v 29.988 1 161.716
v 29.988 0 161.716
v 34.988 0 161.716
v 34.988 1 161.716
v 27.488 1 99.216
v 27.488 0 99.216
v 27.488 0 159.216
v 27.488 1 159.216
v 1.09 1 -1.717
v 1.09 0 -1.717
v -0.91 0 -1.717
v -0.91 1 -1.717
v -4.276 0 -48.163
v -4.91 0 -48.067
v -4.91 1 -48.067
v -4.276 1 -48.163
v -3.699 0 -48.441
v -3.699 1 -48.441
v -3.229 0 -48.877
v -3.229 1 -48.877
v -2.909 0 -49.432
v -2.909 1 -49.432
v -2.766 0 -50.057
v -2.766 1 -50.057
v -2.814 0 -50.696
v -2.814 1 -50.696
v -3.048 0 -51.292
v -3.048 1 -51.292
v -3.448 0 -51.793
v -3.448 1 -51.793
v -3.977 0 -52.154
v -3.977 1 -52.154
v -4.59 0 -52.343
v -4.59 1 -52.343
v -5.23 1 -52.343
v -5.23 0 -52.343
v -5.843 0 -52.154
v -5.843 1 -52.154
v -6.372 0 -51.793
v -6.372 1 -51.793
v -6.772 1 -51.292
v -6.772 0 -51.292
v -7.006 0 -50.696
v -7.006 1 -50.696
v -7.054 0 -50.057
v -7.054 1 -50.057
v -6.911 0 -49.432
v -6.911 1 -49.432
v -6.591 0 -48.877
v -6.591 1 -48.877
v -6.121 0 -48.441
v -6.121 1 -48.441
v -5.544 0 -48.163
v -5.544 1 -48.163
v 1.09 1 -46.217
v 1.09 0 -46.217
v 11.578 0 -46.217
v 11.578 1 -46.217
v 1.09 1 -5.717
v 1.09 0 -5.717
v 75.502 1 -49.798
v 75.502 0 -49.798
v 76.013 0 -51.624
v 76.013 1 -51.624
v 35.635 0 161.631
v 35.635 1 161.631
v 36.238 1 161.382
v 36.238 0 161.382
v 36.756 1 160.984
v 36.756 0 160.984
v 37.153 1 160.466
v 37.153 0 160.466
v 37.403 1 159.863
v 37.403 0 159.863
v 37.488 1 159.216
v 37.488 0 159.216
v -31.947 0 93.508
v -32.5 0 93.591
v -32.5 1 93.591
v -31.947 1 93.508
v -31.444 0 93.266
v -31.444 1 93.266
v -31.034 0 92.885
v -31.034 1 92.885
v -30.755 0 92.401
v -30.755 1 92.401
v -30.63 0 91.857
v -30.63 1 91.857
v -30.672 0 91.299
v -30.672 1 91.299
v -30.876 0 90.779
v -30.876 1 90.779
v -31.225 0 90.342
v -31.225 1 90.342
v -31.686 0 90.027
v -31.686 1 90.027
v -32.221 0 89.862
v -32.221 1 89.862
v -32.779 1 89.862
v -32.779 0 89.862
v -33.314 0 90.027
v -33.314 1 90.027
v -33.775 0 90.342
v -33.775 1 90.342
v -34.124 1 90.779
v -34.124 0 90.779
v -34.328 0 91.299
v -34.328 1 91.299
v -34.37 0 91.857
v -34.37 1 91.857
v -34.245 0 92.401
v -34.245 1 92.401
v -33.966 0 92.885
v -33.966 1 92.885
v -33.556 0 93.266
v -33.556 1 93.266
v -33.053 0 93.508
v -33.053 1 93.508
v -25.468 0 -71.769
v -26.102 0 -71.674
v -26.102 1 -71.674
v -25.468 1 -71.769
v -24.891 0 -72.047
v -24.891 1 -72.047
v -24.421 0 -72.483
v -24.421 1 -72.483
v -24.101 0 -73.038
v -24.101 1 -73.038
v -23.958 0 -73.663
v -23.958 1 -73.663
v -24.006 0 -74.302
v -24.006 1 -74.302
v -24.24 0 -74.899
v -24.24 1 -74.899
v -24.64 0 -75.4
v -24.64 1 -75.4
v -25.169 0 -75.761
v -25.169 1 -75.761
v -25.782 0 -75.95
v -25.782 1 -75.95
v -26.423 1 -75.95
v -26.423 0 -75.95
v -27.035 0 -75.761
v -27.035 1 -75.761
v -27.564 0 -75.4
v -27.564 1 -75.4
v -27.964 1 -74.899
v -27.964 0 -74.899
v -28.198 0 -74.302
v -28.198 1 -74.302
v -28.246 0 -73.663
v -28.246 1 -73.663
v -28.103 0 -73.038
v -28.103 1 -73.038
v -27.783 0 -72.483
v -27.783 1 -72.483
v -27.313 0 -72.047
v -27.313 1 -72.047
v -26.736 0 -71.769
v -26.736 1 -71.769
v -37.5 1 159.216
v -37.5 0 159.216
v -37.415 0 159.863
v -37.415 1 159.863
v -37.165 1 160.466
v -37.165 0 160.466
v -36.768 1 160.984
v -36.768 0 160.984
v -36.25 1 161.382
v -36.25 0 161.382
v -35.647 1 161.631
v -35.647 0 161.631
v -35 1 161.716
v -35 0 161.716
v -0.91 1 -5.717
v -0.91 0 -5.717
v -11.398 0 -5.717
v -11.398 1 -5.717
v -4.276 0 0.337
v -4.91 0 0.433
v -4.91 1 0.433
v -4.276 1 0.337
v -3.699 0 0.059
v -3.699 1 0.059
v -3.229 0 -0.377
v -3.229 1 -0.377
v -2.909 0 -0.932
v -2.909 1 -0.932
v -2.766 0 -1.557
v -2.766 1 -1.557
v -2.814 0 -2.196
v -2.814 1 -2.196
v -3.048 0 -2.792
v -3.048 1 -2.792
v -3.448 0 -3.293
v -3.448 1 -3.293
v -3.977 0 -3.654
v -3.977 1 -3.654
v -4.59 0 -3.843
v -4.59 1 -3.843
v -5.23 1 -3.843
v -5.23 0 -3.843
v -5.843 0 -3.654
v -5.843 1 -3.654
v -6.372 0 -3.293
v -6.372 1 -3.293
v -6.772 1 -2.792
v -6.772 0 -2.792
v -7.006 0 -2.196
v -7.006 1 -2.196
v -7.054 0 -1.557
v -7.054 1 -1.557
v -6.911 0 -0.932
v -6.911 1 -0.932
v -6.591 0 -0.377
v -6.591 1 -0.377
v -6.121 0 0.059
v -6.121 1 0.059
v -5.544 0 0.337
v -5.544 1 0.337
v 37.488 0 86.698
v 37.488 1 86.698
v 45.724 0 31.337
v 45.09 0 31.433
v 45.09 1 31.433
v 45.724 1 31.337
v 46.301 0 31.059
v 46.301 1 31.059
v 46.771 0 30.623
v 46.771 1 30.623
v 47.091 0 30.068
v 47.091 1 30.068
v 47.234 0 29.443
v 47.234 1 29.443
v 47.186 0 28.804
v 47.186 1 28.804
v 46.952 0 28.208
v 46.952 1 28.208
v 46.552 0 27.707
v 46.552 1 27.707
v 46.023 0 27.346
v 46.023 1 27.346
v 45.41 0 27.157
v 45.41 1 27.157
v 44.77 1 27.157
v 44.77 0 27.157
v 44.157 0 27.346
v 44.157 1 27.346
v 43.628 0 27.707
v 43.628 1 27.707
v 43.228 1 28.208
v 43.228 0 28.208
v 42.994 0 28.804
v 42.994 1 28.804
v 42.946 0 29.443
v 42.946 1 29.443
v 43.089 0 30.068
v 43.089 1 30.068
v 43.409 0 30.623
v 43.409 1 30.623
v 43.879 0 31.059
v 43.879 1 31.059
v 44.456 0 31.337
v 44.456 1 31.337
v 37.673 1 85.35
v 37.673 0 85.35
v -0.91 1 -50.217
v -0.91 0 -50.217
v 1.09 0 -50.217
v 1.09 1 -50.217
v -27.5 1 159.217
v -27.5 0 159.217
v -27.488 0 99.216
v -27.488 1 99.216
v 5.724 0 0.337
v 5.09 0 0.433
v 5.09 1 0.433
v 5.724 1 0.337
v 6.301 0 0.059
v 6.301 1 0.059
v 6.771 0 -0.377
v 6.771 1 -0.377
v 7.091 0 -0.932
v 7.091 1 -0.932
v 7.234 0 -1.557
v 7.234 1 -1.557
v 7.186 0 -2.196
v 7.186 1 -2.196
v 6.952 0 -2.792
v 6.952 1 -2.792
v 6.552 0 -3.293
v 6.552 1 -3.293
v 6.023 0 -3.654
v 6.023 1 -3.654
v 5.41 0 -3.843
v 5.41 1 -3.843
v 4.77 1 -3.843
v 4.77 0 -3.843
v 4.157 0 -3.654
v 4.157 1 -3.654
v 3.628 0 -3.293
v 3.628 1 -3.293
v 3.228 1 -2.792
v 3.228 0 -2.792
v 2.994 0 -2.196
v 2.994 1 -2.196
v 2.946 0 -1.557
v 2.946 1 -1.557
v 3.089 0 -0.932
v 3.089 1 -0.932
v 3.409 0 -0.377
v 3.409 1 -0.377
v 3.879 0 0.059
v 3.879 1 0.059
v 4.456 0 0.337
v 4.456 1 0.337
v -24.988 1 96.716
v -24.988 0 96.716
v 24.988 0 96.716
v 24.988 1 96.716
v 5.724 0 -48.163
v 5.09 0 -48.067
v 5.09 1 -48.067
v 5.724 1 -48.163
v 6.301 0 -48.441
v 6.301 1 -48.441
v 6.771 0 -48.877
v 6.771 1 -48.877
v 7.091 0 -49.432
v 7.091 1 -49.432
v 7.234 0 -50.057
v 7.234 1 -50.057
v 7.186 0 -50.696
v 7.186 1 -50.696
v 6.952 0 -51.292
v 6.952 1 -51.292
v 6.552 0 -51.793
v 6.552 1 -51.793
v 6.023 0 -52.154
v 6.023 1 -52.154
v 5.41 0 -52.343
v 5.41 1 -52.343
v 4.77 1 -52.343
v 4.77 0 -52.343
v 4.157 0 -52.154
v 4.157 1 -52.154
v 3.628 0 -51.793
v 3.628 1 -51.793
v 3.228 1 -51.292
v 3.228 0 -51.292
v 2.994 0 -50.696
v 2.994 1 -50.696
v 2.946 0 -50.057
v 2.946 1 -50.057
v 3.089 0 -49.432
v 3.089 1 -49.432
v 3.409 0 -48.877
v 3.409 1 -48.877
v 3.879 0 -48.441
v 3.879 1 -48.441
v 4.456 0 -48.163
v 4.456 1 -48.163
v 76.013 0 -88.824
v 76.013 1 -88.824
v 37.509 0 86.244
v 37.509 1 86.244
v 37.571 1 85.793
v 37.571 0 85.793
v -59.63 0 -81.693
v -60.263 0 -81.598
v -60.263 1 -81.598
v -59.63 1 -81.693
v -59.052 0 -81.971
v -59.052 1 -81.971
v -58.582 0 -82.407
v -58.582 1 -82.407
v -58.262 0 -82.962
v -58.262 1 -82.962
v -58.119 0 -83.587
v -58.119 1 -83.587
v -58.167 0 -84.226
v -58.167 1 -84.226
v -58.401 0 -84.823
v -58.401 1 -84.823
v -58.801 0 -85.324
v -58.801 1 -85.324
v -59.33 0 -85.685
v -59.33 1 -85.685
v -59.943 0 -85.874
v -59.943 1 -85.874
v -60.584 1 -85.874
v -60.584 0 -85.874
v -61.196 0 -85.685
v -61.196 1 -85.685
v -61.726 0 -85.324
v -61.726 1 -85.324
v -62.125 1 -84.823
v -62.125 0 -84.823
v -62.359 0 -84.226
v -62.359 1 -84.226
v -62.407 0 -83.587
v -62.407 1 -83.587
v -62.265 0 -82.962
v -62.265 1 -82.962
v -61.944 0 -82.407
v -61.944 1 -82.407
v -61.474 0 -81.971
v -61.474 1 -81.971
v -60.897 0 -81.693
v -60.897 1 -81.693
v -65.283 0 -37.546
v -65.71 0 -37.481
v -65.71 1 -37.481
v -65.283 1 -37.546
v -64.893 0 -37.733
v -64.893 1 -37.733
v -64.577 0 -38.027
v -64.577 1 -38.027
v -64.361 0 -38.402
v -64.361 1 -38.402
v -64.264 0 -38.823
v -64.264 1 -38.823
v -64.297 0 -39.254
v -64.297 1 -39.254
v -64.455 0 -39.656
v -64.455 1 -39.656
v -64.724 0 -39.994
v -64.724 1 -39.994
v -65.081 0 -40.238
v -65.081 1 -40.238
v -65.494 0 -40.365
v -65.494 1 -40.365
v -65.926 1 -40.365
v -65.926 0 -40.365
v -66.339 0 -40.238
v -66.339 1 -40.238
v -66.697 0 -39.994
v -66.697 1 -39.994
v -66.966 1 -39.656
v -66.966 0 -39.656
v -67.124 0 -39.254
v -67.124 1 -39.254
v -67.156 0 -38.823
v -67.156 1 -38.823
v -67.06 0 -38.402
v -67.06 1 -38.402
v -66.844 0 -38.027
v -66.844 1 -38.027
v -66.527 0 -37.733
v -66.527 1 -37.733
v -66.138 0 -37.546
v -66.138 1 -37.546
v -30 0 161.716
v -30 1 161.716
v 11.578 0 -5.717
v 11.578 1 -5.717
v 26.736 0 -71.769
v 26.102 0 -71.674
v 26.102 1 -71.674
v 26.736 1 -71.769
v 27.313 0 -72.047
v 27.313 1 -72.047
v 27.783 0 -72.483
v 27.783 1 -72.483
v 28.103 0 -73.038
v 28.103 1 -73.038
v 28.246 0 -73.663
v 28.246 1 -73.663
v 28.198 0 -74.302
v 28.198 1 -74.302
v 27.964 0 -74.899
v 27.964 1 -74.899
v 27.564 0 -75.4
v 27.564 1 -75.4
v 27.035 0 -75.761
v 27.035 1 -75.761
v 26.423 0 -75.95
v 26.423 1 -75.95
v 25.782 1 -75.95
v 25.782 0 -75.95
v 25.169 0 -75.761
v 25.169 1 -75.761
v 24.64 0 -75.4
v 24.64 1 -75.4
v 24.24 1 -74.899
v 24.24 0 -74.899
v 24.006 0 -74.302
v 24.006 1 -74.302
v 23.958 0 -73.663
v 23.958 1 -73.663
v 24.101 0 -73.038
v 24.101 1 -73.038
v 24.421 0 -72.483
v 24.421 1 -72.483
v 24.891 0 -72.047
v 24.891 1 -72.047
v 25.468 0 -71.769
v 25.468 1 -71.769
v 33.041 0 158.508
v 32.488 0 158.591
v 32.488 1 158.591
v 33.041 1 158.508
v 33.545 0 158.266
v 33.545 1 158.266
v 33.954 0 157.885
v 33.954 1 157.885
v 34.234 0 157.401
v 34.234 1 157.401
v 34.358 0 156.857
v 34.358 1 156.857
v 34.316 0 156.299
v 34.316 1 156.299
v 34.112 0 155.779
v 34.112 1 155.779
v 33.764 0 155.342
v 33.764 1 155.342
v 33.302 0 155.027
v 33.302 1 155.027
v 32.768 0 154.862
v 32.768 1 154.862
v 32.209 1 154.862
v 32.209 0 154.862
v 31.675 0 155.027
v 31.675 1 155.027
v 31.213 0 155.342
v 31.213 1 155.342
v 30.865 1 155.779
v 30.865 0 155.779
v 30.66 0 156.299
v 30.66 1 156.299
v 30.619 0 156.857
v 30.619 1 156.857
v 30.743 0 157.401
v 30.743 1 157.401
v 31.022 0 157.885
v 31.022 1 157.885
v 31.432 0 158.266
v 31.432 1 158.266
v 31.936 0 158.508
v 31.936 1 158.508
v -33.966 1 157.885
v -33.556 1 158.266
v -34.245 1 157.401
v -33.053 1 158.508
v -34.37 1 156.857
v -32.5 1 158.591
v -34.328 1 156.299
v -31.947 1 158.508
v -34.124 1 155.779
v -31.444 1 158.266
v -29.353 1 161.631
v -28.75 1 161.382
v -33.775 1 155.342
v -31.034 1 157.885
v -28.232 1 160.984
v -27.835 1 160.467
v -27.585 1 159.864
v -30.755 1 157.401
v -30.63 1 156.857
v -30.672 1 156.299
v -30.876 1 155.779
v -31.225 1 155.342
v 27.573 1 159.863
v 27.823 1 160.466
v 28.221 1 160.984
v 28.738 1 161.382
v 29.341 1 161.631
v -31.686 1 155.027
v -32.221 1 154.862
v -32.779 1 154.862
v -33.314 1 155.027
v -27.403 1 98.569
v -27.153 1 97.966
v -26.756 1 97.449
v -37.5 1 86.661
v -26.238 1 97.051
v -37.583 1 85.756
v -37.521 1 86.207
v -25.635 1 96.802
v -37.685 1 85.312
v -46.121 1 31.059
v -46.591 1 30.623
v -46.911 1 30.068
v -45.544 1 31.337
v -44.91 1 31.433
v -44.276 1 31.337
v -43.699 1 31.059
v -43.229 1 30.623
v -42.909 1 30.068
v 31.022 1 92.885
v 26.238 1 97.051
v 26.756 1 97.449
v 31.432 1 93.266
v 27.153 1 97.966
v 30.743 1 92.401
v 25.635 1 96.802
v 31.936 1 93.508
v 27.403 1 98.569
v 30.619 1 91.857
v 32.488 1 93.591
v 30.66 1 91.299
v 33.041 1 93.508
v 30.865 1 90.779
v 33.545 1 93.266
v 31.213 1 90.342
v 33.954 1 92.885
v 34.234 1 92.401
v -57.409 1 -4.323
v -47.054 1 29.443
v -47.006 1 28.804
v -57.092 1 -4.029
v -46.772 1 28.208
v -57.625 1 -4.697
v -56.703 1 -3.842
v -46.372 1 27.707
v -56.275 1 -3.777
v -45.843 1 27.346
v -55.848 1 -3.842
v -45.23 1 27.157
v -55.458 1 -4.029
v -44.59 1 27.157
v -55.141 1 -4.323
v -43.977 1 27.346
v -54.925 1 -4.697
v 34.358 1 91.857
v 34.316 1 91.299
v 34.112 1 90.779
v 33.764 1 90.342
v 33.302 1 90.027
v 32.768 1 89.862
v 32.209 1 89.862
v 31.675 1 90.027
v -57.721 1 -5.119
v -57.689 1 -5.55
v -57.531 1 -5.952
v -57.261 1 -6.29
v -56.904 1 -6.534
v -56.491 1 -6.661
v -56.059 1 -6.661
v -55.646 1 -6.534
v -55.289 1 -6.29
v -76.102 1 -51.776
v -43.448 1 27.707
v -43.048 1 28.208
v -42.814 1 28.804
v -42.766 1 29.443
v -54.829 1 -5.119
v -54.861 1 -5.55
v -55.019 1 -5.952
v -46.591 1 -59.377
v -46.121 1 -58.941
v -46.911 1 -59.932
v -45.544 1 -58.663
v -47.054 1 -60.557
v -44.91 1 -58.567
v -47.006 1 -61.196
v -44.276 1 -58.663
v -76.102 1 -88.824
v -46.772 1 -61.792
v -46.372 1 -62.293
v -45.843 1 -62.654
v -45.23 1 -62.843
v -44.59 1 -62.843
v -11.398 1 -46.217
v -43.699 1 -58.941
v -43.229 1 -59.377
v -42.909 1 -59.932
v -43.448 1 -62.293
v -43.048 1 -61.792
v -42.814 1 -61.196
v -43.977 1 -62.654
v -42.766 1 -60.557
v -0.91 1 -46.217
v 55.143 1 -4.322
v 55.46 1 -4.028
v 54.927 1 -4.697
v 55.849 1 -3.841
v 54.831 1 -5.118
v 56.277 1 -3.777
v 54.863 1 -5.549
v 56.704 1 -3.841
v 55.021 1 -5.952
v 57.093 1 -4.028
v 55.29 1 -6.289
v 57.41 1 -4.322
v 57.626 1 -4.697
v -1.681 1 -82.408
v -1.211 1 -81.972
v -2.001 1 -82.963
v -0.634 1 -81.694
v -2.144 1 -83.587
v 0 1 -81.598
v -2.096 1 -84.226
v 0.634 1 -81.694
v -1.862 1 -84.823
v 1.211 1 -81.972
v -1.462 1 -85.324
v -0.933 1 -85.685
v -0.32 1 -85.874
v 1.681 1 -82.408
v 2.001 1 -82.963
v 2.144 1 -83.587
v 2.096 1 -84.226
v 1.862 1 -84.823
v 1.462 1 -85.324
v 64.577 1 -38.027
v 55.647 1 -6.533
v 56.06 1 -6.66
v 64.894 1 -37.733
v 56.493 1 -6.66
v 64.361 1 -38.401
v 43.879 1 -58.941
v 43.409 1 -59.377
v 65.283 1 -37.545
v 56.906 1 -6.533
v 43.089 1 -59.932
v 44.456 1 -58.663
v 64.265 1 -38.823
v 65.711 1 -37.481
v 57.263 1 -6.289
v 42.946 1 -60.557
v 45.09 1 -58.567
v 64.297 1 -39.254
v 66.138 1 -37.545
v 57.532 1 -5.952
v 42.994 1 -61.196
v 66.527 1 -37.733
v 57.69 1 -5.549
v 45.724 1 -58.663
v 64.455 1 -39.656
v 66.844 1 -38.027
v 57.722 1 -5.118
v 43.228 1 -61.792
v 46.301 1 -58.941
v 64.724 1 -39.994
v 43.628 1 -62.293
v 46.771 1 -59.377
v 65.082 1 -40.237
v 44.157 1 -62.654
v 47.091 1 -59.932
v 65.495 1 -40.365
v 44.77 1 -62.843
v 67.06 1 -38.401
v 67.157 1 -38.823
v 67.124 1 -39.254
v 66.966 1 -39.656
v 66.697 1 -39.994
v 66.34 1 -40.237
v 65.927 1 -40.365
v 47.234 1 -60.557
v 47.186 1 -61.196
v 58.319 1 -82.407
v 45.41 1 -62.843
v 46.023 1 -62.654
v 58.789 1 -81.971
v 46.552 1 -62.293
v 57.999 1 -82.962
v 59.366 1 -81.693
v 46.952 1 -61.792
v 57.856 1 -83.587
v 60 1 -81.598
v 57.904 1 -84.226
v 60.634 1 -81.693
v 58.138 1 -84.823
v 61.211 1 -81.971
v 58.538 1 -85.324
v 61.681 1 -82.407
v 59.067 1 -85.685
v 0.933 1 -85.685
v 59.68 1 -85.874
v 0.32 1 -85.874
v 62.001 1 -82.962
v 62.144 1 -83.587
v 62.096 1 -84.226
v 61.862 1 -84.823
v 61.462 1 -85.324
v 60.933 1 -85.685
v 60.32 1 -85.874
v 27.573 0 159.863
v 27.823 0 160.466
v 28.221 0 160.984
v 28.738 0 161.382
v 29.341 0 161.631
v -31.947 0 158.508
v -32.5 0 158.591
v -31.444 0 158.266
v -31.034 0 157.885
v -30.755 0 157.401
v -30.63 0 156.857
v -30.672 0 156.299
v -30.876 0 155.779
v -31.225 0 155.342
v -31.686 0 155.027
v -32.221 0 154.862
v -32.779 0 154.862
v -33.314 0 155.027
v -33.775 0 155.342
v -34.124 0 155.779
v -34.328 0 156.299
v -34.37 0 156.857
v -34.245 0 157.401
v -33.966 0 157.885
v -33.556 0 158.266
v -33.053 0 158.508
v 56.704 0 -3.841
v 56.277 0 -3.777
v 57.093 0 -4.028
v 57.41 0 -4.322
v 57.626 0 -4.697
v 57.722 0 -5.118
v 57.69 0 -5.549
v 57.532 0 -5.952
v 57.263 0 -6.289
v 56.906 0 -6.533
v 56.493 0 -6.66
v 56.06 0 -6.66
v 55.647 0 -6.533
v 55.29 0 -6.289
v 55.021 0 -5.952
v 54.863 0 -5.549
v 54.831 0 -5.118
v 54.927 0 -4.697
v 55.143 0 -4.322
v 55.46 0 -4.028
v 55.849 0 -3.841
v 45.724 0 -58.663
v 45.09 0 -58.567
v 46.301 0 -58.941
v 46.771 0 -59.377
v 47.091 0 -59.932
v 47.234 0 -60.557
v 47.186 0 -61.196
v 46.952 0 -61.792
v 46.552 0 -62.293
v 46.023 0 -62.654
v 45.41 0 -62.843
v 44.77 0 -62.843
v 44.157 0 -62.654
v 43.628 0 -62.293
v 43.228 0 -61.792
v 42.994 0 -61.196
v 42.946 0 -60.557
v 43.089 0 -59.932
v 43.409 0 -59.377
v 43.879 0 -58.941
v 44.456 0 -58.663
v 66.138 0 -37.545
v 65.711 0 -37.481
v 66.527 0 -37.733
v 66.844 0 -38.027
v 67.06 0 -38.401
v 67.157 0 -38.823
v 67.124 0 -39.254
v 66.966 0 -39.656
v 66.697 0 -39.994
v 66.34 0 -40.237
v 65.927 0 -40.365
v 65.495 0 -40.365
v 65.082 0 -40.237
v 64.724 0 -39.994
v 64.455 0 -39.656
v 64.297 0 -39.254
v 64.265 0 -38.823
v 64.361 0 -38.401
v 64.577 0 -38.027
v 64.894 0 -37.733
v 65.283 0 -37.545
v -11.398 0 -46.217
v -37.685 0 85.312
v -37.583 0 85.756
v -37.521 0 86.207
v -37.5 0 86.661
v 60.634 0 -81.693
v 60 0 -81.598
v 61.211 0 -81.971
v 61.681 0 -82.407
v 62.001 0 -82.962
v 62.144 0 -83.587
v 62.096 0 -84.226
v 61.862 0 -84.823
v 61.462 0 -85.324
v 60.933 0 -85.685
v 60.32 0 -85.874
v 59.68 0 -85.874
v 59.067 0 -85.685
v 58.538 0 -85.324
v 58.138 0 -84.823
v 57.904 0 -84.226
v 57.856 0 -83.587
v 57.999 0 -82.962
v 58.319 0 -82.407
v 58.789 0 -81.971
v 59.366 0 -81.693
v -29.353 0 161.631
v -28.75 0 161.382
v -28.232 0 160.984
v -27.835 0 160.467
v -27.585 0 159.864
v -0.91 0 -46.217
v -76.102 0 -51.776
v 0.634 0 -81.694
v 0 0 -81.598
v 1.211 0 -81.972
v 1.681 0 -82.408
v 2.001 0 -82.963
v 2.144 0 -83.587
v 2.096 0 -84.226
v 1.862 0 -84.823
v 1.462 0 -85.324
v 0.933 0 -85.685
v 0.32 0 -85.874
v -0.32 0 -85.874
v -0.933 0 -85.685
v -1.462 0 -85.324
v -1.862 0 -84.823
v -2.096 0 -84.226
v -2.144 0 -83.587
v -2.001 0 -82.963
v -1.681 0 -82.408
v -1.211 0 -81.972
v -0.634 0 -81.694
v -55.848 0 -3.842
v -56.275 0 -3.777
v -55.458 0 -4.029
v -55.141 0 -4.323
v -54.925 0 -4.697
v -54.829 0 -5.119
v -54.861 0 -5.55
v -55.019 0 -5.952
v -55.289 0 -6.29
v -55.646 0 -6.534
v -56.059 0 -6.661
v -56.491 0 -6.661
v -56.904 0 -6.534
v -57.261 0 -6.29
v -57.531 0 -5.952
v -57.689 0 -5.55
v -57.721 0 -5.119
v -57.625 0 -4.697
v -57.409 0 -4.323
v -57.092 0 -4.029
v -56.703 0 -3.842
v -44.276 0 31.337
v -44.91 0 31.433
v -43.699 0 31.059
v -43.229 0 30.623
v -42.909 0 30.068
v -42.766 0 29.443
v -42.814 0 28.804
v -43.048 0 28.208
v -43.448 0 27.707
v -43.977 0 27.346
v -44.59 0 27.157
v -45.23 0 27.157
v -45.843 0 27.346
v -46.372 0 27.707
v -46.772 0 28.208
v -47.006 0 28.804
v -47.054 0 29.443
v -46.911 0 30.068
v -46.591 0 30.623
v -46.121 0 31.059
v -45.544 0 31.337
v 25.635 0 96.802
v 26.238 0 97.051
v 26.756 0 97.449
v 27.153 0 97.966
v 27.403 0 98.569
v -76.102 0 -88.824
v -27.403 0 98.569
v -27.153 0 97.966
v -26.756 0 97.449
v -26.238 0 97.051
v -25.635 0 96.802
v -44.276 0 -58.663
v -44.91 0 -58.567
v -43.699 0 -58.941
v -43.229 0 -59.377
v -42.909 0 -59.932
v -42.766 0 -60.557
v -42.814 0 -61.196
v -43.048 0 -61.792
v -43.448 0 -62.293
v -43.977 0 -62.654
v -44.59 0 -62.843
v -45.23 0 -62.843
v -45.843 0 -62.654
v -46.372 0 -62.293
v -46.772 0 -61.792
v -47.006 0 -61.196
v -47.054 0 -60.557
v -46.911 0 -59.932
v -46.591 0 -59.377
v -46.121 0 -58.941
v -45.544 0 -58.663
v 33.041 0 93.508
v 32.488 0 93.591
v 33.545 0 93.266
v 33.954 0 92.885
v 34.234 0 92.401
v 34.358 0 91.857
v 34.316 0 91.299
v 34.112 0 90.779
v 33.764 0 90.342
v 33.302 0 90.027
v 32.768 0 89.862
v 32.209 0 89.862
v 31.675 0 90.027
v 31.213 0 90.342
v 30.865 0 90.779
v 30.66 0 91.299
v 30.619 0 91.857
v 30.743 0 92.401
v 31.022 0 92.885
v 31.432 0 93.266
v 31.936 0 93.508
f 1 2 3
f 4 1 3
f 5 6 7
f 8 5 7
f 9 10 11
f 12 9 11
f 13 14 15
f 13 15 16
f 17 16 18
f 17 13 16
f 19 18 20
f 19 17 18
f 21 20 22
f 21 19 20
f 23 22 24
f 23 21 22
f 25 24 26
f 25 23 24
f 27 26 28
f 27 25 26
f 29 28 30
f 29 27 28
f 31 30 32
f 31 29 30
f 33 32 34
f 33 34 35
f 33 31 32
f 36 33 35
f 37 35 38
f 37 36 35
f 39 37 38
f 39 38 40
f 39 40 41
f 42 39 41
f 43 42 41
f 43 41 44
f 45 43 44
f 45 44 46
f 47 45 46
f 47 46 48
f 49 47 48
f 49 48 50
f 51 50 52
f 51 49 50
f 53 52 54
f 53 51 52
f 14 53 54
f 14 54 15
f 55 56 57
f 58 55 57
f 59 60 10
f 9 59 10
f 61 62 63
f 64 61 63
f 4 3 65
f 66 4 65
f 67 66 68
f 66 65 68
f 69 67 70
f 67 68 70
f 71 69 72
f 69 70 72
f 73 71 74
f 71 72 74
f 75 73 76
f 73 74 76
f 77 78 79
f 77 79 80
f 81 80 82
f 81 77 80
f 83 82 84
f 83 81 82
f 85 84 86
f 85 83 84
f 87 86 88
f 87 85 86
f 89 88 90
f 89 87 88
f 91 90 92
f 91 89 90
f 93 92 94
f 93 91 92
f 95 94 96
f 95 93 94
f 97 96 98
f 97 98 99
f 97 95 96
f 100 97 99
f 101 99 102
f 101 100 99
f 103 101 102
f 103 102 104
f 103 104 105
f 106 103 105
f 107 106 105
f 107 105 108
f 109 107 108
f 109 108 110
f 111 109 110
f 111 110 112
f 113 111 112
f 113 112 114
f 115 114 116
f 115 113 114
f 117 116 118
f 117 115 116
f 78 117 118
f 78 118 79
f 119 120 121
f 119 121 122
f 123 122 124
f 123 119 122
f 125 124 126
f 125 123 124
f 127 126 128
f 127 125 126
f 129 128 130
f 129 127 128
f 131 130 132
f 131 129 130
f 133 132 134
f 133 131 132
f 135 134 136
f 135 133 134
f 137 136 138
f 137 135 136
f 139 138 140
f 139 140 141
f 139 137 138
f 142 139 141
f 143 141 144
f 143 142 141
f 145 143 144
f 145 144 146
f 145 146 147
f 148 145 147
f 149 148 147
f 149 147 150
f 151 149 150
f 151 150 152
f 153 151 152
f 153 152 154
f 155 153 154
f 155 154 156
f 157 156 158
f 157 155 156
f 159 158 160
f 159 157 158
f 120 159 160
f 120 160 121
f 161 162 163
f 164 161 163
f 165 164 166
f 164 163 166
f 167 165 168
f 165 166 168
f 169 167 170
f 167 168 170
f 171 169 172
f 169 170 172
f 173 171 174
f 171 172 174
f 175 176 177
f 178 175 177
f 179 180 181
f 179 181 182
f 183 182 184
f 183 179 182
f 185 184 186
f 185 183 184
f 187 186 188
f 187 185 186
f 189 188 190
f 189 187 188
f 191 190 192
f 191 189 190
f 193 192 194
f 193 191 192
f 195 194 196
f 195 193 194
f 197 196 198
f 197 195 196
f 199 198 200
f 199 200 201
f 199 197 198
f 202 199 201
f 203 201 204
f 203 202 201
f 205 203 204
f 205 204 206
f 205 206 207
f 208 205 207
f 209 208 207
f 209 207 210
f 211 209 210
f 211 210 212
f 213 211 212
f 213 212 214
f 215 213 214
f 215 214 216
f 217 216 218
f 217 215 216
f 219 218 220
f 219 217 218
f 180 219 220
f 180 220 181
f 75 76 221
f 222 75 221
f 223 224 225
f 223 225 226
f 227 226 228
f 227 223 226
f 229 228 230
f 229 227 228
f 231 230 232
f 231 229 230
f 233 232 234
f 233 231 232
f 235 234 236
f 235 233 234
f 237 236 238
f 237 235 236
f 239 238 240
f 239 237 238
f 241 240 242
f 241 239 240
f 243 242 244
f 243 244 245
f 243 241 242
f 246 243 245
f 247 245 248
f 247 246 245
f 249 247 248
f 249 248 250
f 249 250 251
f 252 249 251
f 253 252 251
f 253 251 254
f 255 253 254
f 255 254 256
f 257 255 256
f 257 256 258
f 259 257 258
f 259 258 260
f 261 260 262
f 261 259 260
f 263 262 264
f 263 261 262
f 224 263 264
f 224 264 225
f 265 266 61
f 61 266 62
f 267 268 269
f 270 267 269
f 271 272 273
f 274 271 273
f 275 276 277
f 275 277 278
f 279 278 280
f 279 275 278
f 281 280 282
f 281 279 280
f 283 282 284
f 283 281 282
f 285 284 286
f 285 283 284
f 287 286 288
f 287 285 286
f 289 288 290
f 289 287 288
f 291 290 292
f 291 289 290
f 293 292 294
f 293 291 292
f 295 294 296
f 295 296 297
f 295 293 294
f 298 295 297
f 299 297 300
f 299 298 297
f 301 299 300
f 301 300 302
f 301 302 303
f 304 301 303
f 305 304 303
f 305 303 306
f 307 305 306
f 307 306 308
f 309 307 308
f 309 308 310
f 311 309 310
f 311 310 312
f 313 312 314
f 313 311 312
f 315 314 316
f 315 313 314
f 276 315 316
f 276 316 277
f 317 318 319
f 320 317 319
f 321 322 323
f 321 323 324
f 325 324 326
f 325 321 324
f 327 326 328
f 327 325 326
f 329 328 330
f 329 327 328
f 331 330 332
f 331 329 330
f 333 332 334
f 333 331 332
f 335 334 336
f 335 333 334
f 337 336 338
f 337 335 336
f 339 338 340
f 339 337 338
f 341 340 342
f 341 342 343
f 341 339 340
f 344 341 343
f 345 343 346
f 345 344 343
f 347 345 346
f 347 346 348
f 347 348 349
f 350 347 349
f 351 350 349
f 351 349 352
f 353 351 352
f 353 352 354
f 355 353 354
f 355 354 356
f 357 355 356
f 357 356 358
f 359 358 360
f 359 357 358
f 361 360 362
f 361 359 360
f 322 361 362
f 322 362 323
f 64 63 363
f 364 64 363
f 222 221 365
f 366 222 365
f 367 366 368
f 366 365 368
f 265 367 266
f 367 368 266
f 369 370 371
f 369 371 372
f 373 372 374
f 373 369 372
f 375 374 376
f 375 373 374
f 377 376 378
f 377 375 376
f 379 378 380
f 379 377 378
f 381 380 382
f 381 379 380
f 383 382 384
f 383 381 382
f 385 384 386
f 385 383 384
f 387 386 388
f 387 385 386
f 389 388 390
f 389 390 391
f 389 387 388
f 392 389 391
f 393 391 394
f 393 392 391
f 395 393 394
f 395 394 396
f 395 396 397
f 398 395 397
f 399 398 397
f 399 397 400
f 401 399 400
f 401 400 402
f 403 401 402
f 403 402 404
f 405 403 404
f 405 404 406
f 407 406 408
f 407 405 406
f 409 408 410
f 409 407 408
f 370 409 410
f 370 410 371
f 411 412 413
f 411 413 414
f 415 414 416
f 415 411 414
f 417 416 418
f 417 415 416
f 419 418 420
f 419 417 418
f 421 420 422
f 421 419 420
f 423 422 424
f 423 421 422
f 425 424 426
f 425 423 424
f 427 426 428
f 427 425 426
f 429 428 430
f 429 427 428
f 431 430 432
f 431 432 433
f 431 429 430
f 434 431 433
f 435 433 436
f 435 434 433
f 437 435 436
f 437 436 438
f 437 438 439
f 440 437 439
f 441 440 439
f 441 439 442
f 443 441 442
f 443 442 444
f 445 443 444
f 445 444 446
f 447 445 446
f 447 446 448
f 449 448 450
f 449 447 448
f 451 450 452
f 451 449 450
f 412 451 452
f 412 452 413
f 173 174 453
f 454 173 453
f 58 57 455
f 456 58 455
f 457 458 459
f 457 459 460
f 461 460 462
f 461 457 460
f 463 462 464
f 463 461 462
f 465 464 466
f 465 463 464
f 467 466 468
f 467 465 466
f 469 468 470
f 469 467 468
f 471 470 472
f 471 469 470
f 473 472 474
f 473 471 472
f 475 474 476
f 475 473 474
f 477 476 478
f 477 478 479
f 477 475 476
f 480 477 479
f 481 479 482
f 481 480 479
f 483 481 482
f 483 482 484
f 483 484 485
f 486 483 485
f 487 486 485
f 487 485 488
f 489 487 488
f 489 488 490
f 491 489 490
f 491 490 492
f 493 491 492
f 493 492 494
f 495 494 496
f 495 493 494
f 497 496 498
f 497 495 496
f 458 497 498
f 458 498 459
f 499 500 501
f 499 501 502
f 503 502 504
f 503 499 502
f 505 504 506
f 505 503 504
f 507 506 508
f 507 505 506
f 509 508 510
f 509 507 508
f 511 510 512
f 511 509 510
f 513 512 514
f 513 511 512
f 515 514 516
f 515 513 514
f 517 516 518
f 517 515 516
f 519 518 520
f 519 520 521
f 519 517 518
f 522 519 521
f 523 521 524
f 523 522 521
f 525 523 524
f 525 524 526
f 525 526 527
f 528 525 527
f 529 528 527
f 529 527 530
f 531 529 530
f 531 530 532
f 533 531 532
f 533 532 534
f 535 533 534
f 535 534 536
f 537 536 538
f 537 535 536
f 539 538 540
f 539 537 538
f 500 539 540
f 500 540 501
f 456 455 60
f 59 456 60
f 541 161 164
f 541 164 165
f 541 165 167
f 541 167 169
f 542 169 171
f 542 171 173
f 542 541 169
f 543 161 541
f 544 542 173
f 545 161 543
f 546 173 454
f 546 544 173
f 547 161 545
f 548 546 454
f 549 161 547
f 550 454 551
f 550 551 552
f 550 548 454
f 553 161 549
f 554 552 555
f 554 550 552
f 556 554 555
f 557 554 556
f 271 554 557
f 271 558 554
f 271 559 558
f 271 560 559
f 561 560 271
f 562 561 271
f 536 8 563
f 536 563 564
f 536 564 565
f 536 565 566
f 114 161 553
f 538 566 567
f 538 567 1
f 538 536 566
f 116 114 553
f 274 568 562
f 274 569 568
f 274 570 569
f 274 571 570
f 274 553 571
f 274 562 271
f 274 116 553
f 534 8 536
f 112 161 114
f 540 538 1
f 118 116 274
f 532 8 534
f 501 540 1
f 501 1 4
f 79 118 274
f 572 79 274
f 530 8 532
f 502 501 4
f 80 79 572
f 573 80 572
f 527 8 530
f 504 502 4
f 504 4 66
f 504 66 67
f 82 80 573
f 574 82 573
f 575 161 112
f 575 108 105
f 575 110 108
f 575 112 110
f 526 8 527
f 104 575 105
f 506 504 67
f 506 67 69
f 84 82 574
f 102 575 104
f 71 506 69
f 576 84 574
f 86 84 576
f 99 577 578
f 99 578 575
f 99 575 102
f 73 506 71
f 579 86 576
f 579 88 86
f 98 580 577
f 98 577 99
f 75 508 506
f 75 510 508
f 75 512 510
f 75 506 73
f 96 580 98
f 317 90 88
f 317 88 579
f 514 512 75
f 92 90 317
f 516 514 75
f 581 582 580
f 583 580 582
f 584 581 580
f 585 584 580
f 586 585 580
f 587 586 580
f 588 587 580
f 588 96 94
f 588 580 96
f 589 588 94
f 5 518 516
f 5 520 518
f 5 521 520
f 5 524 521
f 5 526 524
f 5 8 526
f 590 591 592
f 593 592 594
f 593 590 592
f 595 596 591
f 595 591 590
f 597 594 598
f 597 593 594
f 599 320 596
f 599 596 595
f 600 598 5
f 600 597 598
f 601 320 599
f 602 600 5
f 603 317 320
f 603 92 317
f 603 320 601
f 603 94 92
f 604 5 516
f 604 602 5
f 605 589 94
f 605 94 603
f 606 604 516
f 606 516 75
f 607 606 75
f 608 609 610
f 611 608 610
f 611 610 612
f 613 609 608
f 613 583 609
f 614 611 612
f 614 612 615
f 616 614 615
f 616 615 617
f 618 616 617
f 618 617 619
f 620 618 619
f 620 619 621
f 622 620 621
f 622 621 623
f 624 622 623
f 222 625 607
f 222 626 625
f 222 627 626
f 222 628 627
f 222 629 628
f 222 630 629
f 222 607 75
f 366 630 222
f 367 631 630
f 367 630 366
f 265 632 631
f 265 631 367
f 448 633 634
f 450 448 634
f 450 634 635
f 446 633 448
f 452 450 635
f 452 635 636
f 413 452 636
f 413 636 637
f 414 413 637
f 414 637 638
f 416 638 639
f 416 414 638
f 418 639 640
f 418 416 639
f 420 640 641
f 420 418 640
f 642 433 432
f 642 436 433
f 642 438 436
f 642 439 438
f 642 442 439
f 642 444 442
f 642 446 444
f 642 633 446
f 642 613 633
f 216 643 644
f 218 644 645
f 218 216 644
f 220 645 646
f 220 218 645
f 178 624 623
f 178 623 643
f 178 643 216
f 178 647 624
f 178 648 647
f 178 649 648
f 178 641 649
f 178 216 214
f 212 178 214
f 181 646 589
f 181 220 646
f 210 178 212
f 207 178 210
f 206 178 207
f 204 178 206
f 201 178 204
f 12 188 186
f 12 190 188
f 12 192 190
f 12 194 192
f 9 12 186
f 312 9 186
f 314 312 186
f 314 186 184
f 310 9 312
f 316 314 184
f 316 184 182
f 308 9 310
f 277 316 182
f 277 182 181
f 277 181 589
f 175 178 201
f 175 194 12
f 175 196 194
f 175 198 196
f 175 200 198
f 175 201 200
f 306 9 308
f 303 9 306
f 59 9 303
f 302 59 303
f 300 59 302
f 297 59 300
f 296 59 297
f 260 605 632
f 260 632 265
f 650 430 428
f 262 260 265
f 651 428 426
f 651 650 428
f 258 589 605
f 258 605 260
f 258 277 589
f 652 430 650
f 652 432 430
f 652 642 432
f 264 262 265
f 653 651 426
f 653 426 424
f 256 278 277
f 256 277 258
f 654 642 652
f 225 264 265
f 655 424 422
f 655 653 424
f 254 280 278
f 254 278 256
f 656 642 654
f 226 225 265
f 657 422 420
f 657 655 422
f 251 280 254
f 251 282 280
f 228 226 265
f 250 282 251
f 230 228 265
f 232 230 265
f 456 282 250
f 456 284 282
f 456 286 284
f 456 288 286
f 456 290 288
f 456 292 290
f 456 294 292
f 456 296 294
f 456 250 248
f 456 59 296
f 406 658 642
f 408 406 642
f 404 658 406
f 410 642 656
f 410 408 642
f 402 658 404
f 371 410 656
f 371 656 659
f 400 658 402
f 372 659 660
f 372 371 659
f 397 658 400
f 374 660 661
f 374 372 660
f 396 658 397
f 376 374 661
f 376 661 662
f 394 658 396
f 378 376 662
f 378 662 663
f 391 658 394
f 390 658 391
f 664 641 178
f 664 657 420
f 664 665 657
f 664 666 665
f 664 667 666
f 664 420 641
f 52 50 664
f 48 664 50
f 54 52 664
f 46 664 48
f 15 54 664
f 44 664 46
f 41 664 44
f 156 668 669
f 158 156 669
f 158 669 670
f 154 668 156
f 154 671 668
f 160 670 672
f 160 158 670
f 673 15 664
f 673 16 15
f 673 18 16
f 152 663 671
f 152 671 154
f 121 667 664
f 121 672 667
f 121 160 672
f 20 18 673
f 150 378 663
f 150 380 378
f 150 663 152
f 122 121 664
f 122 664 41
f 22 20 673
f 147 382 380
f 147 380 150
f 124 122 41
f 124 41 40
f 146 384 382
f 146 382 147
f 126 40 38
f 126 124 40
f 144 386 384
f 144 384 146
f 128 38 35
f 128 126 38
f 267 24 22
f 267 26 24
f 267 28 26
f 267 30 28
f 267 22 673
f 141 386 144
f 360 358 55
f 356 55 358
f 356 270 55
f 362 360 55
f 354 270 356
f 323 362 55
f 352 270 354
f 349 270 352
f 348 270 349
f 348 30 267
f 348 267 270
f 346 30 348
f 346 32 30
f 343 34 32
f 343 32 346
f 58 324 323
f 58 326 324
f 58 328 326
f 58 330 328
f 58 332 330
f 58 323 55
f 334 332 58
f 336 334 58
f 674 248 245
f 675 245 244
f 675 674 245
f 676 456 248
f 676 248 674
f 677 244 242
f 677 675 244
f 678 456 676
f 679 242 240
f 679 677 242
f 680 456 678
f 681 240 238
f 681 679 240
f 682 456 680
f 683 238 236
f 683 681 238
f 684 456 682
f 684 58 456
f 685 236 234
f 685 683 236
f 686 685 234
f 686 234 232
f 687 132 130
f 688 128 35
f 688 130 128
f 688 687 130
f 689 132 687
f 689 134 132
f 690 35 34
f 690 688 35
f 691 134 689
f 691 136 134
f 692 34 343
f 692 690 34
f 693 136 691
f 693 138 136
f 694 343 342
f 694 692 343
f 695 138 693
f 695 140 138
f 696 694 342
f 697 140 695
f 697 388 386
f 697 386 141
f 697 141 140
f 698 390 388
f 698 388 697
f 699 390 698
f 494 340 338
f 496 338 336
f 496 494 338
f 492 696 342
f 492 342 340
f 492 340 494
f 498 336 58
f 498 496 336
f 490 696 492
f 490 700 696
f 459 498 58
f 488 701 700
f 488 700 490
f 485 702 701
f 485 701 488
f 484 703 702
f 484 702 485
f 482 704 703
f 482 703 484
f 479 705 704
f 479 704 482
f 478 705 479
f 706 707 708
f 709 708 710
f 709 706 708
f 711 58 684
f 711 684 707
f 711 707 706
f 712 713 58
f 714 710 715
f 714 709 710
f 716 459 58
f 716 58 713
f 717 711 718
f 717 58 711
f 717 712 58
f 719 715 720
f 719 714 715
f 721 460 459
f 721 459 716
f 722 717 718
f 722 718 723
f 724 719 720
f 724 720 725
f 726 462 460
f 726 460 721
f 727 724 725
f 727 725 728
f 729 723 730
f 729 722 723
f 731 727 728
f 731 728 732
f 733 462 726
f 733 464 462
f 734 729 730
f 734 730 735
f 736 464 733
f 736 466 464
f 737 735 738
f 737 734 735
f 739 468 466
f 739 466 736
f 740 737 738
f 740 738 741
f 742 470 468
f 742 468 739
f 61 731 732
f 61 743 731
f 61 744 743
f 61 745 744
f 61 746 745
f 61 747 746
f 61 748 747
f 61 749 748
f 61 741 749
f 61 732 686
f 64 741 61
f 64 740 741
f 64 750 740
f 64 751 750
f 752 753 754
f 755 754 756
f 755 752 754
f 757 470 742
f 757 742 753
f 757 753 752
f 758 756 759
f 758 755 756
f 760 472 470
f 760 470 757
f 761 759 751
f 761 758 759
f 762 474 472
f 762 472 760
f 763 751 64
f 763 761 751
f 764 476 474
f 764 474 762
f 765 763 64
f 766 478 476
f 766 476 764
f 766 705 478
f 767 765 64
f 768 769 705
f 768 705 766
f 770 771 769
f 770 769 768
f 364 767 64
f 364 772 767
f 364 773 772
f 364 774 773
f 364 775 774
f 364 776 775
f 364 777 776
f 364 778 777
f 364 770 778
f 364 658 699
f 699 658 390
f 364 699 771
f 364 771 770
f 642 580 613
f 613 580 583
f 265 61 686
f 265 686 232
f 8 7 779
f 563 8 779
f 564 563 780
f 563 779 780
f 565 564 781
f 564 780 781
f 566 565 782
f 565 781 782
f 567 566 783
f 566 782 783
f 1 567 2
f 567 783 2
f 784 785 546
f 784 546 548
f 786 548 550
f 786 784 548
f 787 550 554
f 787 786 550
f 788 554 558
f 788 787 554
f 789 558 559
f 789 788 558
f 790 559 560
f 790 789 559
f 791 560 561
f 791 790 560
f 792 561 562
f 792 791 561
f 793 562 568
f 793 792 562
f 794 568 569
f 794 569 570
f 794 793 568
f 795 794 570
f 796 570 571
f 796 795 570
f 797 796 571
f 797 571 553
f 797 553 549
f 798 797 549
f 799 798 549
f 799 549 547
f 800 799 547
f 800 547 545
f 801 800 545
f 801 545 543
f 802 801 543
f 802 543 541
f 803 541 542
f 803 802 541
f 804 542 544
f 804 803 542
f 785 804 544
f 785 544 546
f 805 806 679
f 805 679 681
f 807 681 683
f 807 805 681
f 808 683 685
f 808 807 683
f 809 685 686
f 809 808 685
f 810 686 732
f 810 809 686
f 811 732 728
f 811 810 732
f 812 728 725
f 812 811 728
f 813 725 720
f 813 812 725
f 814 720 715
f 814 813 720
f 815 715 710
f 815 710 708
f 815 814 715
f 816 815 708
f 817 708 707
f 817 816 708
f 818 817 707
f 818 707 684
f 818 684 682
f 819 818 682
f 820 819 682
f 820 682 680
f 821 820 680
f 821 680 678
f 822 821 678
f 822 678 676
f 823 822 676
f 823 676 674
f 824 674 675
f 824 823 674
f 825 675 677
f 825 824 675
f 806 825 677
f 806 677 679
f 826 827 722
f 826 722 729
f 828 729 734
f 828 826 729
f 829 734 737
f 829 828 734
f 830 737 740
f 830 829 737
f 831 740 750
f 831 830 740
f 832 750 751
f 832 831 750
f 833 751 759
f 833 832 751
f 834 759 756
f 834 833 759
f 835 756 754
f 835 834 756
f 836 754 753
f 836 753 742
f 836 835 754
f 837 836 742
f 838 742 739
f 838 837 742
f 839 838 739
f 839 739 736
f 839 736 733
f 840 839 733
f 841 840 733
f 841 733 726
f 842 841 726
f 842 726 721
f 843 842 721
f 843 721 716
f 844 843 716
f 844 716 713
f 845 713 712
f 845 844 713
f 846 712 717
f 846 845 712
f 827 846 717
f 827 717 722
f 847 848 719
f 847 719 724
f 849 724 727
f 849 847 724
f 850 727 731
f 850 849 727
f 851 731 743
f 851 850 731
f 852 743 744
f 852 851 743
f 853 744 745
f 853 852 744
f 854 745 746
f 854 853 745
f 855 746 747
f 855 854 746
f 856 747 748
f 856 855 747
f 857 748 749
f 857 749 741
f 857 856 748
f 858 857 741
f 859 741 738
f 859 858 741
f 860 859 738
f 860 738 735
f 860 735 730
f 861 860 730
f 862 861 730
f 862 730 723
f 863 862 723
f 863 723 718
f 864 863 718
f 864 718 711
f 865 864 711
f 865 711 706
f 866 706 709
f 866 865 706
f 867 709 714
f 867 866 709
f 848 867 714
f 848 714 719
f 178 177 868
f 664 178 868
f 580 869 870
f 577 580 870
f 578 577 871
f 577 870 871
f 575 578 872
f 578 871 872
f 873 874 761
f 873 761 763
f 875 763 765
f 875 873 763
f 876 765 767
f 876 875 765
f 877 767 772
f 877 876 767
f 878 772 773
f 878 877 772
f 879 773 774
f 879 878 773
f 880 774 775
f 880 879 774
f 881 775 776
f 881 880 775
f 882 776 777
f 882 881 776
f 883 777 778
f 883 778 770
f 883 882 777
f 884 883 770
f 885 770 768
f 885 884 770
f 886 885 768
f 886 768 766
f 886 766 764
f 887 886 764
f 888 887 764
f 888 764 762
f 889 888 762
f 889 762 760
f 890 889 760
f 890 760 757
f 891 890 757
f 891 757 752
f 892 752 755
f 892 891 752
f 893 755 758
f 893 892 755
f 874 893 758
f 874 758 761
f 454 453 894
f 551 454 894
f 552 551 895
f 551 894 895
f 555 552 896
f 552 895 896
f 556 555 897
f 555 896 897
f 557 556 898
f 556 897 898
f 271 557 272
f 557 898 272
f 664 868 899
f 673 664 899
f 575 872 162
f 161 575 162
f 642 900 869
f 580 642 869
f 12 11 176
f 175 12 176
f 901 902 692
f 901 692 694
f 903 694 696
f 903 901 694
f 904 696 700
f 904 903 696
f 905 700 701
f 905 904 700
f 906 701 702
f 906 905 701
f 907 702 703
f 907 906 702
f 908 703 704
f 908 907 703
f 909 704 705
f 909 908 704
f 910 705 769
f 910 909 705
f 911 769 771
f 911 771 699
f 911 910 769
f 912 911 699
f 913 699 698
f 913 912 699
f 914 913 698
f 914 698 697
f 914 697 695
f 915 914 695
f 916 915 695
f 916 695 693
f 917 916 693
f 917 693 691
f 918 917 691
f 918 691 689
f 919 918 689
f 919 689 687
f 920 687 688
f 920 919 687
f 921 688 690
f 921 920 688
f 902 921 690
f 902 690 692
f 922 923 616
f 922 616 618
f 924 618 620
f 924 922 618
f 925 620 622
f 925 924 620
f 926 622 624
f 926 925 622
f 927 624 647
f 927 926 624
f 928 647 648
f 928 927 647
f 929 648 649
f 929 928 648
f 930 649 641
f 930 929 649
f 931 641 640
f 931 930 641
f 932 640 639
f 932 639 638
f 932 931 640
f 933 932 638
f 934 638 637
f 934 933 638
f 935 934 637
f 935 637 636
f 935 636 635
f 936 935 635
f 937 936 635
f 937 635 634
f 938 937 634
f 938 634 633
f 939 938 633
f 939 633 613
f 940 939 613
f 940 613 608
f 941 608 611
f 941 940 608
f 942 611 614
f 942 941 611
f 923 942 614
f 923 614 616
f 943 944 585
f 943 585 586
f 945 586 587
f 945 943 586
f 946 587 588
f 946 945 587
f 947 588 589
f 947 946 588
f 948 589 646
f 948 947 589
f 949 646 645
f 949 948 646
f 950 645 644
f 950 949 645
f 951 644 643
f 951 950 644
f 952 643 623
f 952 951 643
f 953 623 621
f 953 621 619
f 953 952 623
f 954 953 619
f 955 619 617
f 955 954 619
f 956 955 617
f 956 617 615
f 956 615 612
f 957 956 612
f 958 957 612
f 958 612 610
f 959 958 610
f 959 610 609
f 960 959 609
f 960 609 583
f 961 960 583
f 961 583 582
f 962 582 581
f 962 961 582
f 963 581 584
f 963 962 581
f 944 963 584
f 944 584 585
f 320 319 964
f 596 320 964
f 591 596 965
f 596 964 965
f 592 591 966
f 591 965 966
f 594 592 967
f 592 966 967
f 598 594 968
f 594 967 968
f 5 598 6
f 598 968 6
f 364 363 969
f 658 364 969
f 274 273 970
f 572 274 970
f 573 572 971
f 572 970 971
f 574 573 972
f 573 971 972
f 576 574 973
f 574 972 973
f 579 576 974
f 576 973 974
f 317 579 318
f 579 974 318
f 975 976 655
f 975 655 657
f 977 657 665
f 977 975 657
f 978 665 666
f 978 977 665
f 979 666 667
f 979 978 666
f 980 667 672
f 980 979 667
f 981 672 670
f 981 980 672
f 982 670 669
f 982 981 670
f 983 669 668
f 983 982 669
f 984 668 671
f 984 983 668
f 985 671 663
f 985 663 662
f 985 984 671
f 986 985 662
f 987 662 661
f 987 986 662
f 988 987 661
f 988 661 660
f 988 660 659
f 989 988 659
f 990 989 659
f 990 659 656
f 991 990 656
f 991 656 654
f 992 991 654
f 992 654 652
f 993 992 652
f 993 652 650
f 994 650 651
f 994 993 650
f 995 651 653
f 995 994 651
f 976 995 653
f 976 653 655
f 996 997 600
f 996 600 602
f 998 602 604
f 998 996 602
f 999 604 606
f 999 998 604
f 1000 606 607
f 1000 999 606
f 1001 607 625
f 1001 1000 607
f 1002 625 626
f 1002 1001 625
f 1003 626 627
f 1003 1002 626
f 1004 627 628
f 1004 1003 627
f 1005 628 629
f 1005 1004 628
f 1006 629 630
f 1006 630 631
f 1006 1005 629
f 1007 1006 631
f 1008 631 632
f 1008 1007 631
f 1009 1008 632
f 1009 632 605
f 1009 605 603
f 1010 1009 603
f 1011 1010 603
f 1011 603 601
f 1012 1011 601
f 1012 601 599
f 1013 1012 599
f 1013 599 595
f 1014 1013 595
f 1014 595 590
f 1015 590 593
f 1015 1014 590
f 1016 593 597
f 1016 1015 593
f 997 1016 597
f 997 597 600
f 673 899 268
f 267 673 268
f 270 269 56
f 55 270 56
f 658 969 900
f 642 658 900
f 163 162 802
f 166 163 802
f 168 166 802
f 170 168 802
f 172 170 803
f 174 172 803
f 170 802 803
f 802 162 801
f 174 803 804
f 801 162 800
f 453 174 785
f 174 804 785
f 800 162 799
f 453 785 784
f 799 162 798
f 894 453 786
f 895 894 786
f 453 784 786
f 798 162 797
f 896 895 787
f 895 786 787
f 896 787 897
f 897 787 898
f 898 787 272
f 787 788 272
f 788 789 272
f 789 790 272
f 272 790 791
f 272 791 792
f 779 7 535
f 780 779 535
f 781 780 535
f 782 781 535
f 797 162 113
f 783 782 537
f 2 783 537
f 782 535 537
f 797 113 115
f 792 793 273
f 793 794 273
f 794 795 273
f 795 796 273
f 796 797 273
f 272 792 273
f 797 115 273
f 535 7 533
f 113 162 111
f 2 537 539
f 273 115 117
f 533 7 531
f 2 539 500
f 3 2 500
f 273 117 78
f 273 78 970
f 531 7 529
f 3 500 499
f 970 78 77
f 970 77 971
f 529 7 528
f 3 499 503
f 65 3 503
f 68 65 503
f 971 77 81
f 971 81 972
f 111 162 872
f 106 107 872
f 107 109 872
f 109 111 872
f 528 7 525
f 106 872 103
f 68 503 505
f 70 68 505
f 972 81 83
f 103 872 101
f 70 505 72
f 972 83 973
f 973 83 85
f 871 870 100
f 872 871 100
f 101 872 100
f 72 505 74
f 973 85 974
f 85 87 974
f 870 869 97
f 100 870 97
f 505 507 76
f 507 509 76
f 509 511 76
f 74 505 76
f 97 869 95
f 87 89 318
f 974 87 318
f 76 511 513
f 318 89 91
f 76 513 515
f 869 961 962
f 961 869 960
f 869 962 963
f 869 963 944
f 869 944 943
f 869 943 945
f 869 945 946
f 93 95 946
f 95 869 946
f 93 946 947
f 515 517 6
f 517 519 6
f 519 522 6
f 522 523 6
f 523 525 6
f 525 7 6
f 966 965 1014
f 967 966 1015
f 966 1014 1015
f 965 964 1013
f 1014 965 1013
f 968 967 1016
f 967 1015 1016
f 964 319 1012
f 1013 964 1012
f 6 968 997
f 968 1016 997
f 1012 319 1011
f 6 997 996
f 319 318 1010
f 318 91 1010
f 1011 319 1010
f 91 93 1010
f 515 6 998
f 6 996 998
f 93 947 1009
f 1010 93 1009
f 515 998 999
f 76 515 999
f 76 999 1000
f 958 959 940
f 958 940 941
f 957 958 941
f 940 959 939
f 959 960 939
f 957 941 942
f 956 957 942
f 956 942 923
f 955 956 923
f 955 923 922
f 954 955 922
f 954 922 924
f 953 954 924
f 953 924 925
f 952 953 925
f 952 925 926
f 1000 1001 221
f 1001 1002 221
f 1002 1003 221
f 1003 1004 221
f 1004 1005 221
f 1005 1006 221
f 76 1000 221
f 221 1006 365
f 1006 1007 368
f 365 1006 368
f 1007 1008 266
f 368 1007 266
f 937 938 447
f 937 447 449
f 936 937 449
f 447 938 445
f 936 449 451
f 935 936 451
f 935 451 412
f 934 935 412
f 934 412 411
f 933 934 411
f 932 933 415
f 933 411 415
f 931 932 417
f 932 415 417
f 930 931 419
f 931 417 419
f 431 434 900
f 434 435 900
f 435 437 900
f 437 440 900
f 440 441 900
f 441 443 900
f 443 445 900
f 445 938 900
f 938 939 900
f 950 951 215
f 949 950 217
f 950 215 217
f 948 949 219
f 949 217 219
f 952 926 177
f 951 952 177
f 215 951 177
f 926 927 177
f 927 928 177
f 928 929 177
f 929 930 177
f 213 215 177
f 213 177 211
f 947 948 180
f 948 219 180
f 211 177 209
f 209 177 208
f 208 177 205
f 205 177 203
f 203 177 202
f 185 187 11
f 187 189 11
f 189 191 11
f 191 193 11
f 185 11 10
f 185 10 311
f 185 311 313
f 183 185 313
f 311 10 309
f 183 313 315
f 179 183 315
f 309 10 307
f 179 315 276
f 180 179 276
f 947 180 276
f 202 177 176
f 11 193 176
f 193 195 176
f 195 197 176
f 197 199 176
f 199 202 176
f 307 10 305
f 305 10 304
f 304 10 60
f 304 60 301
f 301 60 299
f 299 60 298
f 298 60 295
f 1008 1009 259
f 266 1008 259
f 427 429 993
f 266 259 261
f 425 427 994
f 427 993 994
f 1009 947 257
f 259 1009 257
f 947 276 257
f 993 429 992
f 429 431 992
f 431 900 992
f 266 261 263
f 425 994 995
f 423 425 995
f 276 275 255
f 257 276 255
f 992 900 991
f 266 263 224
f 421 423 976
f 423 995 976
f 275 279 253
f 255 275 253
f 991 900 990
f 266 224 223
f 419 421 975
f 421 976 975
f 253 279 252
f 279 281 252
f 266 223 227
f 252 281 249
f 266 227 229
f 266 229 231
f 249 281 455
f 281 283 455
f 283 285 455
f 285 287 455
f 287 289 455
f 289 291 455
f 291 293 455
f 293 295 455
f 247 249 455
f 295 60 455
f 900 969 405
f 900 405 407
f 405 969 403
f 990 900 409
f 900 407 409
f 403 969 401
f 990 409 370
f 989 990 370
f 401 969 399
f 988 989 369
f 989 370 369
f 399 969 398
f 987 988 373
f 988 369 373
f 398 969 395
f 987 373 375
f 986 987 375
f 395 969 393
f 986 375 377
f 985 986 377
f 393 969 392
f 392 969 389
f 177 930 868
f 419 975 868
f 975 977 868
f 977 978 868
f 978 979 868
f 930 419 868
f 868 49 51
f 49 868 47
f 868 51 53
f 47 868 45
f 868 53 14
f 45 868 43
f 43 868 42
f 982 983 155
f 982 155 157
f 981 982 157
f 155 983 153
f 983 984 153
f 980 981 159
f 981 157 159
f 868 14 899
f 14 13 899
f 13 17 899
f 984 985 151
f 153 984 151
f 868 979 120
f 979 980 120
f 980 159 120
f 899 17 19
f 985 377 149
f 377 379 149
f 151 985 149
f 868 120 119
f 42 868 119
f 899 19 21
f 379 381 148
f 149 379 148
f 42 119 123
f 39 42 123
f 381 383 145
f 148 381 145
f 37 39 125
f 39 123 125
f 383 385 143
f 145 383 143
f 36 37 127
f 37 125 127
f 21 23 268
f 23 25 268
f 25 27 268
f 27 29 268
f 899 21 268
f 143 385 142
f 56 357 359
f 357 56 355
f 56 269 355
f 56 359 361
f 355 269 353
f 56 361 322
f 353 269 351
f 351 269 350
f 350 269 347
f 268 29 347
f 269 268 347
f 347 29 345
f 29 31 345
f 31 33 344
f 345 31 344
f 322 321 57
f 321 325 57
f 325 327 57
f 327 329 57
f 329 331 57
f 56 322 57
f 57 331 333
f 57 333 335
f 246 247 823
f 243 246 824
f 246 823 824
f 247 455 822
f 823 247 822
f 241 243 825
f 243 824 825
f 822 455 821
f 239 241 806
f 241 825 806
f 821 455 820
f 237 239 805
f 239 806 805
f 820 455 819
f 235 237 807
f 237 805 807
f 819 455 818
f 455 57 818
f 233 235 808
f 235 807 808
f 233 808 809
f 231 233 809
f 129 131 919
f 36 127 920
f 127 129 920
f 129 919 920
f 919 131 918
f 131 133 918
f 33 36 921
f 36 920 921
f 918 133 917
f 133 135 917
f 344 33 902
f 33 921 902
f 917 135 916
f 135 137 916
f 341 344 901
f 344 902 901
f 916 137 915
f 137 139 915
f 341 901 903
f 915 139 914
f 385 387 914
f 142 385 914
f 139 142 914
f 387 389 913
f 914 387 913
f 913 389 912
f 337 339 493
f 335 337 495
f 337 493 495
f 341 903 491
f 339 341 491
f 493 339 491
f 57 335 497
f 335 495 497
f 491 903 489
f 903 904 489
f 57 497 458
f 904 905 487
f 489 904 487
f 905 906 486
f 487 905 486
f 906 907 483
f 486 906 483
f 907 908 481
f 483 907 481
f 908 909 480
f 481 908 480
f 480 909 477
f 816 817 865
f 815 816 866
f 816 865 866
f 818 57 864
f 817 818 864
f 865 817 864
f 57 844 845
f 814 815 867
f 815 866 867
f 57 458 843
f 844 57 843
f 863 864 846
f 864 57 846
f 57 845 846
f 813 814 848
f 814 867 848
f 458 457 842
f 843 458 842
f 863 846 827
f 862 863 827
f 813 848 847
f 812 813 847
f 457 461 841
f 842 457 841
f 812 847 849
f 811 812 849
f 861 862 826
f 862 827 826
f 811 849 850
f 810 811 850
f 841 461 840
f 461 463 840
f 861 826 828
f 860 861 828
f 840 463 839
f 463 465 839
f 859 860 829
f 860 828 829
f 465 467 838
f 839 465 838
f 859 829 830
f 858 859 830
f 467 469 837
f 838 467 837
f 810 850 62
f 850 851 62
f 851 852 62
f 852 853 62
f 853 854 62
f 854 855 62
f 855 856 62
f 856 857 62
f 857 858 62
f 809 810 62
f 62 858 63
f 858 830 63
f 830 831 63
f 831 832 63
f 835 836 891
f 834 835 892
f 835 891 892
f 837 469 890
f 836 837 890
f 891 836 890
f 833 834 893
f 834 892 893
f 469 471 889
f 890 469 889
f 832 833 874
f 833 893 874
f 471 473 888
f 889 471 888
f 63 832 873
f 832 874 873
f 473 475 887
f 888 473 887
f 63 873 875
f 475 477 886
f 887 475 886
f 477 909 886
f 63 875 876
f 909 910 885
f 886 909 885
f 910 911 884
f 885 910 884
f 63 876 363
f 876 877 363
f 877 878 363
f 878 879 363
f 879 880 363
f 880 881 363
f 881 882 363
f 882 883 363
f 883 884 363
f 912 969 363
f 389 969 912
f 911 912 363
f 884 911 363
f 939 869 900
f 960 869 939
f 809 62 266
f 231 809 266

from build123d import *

# Parameters (mm, degrees)
SKETCH26_R          = 1.875
SKETCH26_R_2        = 2.15
SKETCH26_R_3        = 1.45
BOSS_EXTRUDE6_DEPTH = 1


with BuildPart() as part:
    # Sketch26 → Boss-Extrude6 (new body)
    with BuildSketch(Plane(origin=(0, 0, 0), x_dir=(1, 0, 0), z_dir=(0, 1, 0))):
        with BuildLine():
            Line((76.013272408, 51.623832483), (76.013272408, 88.823544949))
            Line((76.013272408, 88.823544949), (-76.102081629, 88.823544949))
            Line((-76.102081629, 88.823544949), (-76.102081629, 51.776273242))
            Line((-76.102081629, 51.776273242), (-37.685470178, -85.312264175))
            ThreePointArc((-37.685470178, -85.312264175), (-37.546584556, -85.980512893), (-37.5, -86.661450073))
            Line((-37.5, -86.661450073), (-37.5, -159.216442532))
            ThreePointArc((-37.5, -159.216442532), (-36.767766953, -160.984209485), (-35, -161.716442532))
            Line((-35, -161.716442532), (-30, -161.716442532))
            ThreePointArc((-30, -161.716442532), (-28.232405329, -160.98438175), (-27.500000047, -159.216929795))
            Line((-27.500000047, -159.216929795), (-27.488305541, -99.215955269))
            ThreePointArc((-27.488305541, -99.215955269), (-26.755900259, -97.448503314), (-24.988305588, -96.716442532))
            Line((-24.988305588, -96.716442532), (24.988305588, -96.716442532))
            ThreePointArc((24.988305588, -96.716442532), (26.756072541, -97.448675579), (27.488305588, -99.216442532))
            Line((27.488305588, -99.216442532), (27.488305588, -159.216442532))
            ThreePointArc((27.488305588, -159.216442532), (28.220538635, -160.984209485), (29.988305588, -161.716442532))
            Line((29.988305588, -161.716442532), (34.988305588, -161.716442532))
            ThreePointArc((34.988305588, -161.716442532), (36.756072541, -160.984209485), (37.488305588, -159.216442532))
            Line((37.488305588, -159.216442532), (37.488305588, -86.69785128))
            ThreePointArc((37.488305588, -86.69785128), (37.534787412, -86.017661841), (37.673368657, -85.350118981))
            Line((37.673368657, -85.350118981), (75.502125614, 49.797698633))
            Line((75.502125614, 49.797698633), (76.013272408, 51.623832483))
        make_face()
        with Locations(Location((-32.5, -156.716442532, 0), (0, 0, 270))):
            Circle(SKETCH26_R, mode=Mode.SUBTRACT)
        with Locations(Location((-32.5, -91.716442532, 0), (0, 0, 270))):
            Circle(SKETCH26_R, mode=Mode.SUBTRACT)
        with Locations(Location((32.488305588, -156.716442532, 0), (0, 0, 270))):
            Circle(SKETCH26_R, mode=Mode.SUBTRACT)
        with Locations(Location((32.488305588, -91.716442532, 0), (0, 0, 270))):
            Circle(SKETCH26_R, mode=Mode.SUBTRACT)
        with Locations(Location((-44.91002895, -29.282587791, 0), (0, 0, 270))):
            Circle(SKETCH26_R_2, mode=Mode.SUBTRACT)
        with Locations(Location((-56.275133419, 5.22710987, 0), (0, 0, 270))):
            Circle(SKETCH26_R_3, mode=Mode.SUBTRACT)
        with Locations(Location((-4.91002895, 1.717412209, 0), (0, 0, 270))):
            Circle(SKETCH26_R_2, mode=Mode.SUBTRACT)
        with Locations(Location((-65.710275059, 38.931384113, 0), (0, 0, 270))):
            Circle(SKETCH26_R_3, mode=Mode.SUBTRACT)
        with Locations(Location((-60.263272408, 83.747616616, 0), (0, 0, 270))):
            Circle(SKETCH26_R_2, mode=Mode.SUBTRACT)
        with Locations(Location((-44.91002895, 60.717412209, 0), (0, 0, 270))):
            Circle(SKETCH26_R_2, mode=Mode.SUBTRACT)
        with Locations(Location((-4.91002895, 50.217412209, 0), (0, 0, 270))):
            Circle(SKETCH26_R_2, mode=Mode.SUBTRACT)
        with Locations(Location((-26.102081629, 73.823544949, 0), (0, 0, 270))):
            Circle(SKETCH26_R_2, mode=Mode.SUBTRACT)
        with Locations(Location((5.08997105, 1.717412209, 0), (0, 0, 270))):
            Circle(SKETCH26_R_2, mode=Mode.SUBTRACT)
        Polygon((11.577692982, 46.217412209), (11.577692982, 5.717412209), (1.08997105, 5.717412209), (1.08997105, 1.717412209), (-0.91002895, 1.717412209), (-0.91002895, 5.717412209), (-11.397750883, 5.717412209), (-11.397750883, 46.217412209), (-0.91002895, 46.217412209), (-0.91002895, 50.217412209), (1.08997105, 50.217412209), (1.08997105, 46.217412209), align=None, mode=Mode.SUBTRACT)
        with Locations(Location((45.08997105, -29.282587791, 0), (0, 0, 270))):
            Circle(SKETCH26_R_2, mode=Mode.SUBTRACT)
        with Locations(Location((56.276531408, 5.226515161, 0), (0, 0, 270))):
            Circle(SKETCH26_R_3, mode=Mode.SUBTRACT)
        with Locations(Location((5.08997105, 50.217412209, 0), (0, 0, 270))):
            Circle(SKETCH26_R_2, mode=Mode.SUBTRACT)
        with Locations(Location((0, 83.74802142, 0), (0, 0, 270))):
            Circle(SKETCH26_R_2, mode=Mode.SUBTRACT)
        with Locations(Location((26.102081629, 73.823544949, 0), (0, 0, 270))):
            Circle(SKETCH26_R_2, mode=Mode.SUBTRACT)
        with Locations(Location((65.7106575, 38.931073679, 0), (0, 0, 270))):
            Circle(SKETCH26_R_3, mode=Mode.SUBTRACT)
        with Locations(Location((45.08997105, 60.717412209, 0), (0, 0, 270))):
            Circle(SKETCH26_R_2, mode=Mode.SUBTRACT)
        with Locations(Location((59.999999999, 83.747618385, 0), (0, 0, 270))):
            Circle(SKETCH26_R_2, mode=Mode.SUBTRACT)
    extrude(amount=BOSS_EXTRUDE6_DEPTH)


solid = part.part
